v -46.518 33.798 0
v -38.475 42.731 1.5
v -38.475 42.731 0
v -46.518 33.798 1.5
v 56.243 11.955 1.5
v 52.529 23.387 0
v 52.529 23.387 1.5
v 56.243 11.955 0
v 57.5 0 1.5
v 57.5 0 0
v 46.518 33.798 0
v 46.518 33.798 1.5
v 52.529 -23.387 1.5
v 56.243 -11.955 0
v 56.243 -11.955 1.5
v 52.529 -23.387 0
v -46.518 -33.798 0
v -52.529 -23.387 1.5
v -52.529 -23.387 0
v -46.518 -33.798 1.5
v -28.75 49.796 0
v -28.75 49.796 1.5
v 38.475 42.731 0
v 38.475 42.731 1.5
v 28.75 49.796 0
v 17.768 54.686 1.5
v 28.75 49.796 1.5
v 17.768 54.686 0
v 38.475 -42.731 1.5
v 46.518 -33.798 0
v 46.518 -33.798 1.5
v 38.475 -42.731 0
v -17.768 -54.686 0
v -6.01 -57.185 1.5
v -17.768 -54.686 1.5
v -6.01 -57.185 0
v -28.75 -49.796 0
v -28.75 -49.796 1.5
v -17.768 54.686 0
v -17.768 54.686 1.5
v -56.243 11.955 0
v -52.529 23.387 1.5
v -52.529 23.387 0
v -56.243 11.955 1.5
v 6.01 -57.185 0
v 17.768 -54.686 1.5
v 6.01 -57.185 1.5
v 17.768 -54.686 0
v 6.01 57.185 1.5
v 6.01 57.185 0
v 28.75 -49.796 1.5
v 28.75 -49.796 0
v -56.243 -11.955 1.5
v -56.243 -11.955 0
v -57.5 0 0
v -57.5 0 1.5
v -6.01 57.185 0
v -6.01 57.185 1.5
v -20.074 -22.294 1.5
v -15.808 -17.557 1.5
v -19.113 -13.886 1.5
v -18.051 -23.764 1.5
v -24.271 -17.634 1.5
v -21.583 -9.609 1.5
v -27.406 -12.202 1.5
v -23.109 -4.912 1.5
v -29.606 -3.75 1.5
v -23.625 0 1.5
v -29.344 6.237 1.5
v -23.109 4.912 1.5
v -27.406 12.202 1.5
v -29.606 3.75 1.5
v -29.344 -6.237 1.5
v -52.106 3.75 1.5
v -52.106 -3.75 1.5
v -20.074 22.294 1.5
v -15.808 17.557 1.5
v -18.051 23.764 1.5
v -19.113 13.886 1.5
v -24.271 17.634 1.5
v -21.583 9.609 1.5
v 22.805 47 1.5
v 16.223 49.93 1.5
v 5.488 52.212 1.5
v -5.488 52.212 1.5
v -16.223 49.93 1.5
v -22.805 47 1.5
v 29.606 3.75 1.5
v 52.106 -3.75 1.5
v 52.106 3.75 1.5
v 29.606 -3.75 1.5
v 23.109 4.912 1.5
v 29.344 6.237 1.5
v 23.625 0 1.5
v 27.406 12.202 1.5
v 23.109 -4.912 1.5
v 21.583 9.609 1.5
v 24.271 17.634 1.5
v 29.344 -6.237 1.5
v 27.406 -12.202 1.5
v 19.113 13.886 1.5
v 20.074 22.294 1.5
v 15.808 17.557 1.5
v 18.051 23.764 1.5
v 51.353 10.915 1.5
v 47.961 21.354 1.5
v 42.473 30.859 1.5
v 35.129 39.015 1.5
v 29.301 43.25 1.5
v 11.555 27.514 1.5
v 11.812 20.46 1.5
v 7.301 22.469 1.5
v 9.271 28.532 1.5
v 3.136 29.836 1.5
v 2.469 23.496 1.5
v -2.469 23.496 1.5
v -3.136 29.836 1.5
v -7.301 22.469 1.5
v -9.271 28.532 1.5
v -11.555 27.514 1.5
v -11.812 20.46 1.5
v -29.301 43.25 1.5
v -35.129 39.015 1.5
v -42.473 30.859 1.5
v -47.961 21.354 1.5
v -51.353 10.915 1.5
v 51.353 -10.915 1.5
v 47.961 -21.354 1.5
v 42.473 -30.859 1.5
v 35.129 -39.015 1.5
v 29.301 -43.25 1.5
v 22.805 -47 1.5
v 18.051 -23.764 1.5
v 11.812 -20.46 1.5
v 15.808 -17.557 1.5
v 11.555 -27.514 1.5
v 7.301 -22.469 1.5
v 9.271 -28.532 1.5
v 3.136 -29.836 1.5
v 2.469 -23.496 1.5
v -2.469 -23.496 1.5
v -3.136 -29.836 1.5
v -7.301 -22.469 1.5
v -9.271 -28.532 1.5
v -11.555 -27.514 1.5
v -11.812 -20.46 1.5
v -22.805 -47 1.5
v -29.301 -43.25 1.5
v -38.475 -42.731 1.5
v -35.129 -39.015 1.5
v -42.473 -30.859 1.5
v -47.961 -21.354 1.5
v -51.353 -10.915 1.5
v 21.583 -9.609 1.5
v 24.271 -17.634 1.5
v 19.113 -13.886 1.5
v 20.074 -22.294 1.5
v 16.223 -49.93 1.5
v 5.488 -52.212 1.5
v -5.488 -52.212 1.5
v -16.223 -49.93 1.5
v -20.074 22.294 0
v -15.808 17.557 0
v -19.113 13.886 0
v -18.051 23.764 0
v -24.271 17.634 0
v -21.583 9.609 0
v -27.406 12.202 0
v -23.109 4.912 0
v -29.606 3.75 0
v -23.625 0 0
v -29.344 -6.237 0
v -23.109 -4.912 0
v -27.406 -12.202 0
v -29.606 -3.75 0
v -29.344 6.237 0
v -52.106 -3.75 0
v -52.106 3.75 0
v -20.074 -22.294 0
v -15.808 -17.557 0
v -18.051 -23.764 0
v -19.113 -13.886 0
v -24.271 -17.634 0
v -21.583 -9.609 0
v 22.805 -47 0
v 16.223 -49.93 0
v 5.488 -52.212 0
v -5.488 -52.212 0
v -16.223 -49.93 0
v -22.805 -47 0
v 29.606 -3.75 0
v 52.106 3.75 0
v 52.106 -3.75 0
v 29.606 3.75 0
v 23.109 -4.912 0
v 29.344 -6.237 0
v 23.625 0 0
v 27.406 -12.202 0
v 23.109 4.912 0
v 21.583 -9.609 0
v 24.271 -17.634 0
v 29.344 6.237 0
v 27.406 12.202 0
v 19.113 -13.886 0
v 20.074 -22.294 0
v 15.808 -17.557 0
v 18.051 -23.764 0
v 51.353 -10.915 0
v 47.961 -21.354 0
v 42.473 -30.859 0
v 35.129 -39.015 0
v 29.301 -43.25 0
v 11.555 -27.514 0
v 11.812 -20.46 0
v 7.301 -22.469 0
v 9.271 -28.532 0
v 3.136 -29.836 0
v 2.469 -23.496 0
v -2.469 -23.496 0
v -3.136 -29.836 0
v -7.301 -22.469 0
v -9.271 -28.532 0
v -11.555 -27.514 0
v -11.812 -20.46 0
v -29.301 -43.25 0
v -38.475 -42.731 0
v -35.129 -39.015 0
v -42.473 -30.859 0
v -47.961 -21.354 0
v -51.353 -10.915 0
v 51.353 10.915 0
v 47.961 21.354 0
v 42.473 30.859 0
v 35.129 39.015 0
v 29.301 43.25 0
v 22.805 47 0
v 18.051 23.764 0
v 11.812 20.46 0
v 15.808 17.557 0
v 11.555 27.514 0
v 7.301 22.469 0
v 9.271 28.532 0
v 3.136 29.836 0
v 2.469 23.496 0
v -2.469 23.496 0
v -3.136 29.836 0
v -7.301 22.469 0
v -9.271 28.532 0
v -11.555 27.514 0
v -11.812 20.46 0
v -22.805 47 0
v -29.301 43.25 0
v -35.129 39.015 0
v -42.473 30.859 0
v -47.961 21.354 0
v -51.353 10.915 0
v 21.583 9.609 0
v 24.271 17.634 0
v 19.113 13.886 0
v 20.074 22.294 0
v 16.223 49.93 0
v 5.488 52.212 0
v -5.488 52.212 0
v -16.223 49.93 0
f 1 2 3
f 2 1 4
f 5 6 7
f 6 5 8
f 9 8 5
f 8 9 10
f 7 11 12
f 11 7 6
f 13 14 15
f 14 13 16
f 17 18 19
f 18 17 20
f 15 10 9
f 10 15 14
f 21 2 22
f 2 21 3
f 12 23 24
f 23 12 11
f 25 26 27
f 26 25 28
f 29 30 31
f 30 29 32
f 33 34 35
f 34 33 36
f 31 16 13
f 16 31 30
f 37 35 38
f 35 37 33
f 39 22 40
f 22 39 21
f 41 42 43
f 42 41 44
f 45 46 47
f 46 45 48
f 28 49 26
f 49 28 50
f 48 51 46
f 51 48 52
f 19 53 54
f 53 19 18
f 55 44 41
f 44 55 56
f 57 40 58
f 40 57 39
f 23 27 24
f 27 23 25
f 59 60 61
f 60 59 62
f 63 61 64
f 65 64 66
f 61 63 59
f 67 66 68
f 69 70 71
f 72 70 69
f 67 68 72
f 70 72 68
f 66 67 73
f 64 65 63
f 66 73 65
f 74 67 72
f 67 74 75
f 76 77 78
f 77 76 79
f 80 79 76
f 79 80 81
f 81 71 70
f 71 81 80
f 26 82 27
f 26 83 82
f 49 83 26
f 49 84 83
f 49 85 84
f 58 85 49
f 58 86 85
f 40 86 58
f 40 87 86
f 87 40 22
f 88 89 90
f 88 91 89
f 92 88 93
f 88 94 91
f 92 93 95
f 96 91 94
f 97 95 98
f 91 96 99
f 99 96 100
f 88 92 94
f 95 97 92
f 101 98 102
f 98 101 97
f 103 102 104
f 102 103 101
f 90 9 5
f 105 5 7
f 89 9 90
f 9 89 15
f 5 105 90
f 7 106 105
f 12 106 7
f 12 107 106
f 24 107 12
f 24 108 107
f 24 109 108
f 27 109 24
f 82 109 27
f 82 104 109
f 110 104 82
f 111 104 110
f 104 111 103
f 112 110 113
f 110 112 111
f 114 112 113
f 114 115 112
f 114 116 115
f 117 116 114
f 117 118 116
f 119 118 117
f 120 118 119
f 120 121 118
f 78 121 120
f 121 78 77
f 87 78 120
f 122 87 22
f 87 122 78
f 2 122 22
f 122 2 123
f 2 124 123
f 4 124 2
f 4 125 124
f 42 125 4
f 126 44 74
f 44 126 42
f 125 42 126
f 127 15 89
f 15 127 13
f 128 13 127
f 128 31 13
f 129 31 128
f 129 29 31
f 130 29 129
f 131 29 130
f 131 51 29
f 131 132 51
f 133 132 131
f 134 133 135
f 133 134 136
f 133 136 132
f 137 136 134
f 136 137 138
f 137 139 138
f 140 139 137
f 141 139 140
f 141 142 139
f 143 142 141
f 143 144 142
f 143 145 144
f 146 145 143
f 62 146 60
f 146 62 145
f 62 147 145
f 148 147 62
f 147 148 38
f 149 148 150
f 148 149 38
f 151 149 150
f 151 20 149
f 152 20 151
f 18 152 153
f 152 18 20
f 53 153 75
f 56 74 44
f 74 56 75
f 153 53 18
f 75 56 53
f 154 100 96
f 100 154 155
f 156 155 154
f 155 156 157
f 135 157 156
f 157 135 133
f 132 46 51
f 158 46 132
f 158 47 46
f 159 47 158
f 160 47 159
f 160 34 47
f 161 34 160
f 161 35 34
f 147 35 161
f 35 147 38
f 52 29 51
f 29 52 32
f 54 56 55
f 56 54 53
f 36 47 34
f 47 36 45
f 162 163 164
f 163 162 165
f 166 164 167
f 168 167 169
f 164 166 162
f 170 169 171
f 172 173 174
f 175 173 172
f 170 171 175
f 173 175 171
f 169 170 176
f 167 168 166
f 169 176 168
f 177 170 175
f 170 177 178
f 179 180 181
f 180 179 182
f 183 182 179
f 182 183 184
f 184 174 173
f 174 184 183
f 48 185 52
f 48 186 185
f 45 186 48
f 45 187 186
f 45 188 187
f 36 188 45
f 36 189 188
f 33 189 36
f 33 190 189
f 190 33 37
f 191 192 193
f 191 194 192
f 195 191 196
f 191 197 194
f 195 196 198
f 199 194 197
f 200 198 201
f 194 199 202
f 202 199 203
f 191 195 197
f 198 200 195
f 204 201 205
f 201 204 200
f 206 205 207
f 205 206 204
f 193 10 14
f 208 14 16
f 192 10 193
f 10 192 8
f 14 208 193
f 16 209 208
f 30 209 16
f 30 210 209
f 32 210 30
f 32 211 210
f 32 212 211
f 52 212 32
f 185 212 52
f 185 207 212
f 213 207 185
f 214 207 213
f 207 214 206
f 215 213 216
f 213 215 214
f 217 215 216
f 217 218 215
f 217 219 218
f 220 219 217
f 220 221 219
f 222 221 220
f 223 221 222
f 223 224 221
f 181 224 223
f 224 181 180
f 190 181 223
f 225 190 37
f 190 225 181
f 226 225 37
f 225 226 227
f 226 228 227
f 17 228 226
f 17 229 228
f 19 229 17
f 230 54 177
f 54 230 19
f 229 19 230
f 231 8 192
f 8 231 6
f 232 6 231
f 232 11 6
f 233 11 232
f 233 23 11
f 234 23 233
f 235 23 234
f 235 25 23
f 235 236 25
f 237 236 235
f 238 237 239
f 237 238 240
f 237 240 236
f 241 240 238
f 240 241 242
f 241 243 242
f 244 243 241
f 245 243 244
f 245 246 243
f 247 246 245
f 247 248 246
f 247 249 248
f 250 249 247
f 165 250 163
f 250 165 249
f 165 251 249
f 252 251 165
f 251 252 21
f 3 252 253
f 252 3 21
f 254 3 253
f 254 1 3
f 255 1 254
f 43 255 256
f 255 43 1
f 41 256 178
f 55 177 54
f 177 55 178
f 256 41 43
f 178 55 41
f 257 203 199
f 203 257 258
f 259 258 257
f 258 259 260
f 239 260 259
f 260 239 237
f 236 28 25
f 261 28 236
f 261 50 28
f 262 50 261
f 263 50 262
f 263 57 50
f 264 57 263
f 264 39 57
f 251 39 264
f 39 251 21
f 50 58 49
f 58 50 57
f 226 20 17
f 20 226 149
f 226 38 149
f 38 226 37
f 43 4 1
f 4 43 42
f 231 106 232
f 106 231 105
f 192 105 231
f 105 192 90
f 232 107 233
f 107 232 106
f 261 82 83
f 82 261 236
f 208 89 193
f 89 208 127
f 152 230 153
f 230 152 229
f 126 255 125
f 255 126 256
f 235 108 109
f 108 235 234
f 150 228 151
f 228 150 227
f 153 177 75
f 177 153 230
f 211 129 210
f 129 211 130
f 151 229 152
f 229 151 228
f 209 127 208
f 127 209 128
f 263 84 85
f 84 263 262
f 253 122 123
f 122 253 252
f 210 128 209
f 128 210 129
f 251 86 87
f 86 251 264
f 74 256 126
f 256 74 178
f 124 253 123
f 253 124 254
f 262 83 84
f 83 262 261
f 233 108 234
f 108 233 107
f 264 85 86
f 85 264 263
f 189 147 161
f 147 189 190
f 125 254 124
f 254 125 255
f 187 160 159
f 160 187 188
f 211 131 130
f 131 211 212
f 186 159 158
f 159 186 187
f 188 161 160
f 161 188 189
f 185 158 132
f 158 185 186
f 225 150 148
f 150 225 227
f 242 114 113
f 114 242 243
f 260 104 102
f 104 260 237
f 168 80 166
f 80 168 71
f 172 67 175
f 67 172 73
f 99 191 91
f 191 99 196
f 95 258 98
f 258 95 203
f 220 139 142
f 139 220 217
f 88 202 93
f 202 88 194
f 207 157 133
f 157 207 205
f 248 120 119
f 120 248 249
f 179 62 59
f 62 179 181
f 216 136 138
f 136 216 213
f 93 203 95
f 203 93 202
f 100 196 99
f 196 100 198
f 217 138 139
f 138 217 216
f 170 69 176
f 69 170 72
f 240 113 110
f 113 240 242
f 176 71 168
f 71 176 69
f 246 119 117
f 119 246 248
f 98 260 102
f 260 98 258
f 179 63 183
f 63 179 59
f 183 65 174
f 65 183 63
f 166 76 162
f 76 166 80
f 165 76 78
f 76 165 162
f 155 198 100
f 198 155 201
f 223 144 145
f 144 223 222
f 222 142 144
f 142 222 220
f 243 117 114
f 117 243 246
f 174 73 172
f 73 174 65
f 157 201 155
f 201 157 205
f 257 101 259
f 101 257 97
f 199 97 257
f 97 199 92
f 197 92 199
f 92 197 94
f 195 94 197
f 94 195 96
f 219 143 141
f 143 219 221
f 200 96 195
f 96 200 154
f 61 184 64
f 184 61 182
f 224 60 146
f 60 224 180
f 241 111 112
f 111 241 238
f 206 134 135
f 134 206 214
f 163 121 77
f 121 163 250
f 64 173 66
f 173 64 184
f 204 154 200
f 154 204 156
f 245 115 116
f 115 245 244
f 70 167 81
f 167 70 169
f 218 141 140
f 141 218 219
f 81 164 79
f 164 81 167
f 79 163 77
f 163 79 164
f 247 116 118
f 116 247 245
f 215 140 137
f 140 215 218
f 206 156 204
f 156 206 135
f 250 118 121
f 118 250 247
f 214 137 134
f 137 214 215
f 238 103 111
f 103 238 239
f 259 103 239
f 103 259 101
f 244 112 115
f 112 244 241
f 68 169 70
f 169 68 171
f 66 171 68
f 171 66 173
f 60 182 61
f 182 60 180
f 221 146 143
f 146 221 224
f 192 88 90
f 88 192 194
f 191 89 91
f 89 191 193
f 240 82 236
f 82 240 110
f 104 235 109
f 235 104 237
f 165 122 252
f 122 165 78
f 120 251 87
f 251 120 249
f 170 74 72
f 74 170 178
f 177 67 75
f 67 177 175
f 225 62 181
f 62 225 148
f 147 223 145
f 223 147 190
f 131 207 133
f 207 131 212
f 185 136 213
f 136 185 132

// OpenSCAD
// AMS Universal Small Spool Adapter v2 Washer 

diam_a = 115;
height = 1.5;
border = 15;

diam_i = 40 + 5;

union(){
    difference () {
        cylinder(h=height, d=diam_a);
        cylinder(h=height, d=(diam_a - border)*1.05);
    }
    difference () {
        cylinder(h=height, d=diam_i + border);
        cylinder(h=height, d=diam_i * 1.05);
    }
    for (i = [0:5]) {
        rotate(i * 60)
        translate([diam_a/2 - diam_i/2 + border/2, 0, height/2])
        cube([diam_a/2 - diam_i/2 - border/2, border/2, height], true);
    }
}
